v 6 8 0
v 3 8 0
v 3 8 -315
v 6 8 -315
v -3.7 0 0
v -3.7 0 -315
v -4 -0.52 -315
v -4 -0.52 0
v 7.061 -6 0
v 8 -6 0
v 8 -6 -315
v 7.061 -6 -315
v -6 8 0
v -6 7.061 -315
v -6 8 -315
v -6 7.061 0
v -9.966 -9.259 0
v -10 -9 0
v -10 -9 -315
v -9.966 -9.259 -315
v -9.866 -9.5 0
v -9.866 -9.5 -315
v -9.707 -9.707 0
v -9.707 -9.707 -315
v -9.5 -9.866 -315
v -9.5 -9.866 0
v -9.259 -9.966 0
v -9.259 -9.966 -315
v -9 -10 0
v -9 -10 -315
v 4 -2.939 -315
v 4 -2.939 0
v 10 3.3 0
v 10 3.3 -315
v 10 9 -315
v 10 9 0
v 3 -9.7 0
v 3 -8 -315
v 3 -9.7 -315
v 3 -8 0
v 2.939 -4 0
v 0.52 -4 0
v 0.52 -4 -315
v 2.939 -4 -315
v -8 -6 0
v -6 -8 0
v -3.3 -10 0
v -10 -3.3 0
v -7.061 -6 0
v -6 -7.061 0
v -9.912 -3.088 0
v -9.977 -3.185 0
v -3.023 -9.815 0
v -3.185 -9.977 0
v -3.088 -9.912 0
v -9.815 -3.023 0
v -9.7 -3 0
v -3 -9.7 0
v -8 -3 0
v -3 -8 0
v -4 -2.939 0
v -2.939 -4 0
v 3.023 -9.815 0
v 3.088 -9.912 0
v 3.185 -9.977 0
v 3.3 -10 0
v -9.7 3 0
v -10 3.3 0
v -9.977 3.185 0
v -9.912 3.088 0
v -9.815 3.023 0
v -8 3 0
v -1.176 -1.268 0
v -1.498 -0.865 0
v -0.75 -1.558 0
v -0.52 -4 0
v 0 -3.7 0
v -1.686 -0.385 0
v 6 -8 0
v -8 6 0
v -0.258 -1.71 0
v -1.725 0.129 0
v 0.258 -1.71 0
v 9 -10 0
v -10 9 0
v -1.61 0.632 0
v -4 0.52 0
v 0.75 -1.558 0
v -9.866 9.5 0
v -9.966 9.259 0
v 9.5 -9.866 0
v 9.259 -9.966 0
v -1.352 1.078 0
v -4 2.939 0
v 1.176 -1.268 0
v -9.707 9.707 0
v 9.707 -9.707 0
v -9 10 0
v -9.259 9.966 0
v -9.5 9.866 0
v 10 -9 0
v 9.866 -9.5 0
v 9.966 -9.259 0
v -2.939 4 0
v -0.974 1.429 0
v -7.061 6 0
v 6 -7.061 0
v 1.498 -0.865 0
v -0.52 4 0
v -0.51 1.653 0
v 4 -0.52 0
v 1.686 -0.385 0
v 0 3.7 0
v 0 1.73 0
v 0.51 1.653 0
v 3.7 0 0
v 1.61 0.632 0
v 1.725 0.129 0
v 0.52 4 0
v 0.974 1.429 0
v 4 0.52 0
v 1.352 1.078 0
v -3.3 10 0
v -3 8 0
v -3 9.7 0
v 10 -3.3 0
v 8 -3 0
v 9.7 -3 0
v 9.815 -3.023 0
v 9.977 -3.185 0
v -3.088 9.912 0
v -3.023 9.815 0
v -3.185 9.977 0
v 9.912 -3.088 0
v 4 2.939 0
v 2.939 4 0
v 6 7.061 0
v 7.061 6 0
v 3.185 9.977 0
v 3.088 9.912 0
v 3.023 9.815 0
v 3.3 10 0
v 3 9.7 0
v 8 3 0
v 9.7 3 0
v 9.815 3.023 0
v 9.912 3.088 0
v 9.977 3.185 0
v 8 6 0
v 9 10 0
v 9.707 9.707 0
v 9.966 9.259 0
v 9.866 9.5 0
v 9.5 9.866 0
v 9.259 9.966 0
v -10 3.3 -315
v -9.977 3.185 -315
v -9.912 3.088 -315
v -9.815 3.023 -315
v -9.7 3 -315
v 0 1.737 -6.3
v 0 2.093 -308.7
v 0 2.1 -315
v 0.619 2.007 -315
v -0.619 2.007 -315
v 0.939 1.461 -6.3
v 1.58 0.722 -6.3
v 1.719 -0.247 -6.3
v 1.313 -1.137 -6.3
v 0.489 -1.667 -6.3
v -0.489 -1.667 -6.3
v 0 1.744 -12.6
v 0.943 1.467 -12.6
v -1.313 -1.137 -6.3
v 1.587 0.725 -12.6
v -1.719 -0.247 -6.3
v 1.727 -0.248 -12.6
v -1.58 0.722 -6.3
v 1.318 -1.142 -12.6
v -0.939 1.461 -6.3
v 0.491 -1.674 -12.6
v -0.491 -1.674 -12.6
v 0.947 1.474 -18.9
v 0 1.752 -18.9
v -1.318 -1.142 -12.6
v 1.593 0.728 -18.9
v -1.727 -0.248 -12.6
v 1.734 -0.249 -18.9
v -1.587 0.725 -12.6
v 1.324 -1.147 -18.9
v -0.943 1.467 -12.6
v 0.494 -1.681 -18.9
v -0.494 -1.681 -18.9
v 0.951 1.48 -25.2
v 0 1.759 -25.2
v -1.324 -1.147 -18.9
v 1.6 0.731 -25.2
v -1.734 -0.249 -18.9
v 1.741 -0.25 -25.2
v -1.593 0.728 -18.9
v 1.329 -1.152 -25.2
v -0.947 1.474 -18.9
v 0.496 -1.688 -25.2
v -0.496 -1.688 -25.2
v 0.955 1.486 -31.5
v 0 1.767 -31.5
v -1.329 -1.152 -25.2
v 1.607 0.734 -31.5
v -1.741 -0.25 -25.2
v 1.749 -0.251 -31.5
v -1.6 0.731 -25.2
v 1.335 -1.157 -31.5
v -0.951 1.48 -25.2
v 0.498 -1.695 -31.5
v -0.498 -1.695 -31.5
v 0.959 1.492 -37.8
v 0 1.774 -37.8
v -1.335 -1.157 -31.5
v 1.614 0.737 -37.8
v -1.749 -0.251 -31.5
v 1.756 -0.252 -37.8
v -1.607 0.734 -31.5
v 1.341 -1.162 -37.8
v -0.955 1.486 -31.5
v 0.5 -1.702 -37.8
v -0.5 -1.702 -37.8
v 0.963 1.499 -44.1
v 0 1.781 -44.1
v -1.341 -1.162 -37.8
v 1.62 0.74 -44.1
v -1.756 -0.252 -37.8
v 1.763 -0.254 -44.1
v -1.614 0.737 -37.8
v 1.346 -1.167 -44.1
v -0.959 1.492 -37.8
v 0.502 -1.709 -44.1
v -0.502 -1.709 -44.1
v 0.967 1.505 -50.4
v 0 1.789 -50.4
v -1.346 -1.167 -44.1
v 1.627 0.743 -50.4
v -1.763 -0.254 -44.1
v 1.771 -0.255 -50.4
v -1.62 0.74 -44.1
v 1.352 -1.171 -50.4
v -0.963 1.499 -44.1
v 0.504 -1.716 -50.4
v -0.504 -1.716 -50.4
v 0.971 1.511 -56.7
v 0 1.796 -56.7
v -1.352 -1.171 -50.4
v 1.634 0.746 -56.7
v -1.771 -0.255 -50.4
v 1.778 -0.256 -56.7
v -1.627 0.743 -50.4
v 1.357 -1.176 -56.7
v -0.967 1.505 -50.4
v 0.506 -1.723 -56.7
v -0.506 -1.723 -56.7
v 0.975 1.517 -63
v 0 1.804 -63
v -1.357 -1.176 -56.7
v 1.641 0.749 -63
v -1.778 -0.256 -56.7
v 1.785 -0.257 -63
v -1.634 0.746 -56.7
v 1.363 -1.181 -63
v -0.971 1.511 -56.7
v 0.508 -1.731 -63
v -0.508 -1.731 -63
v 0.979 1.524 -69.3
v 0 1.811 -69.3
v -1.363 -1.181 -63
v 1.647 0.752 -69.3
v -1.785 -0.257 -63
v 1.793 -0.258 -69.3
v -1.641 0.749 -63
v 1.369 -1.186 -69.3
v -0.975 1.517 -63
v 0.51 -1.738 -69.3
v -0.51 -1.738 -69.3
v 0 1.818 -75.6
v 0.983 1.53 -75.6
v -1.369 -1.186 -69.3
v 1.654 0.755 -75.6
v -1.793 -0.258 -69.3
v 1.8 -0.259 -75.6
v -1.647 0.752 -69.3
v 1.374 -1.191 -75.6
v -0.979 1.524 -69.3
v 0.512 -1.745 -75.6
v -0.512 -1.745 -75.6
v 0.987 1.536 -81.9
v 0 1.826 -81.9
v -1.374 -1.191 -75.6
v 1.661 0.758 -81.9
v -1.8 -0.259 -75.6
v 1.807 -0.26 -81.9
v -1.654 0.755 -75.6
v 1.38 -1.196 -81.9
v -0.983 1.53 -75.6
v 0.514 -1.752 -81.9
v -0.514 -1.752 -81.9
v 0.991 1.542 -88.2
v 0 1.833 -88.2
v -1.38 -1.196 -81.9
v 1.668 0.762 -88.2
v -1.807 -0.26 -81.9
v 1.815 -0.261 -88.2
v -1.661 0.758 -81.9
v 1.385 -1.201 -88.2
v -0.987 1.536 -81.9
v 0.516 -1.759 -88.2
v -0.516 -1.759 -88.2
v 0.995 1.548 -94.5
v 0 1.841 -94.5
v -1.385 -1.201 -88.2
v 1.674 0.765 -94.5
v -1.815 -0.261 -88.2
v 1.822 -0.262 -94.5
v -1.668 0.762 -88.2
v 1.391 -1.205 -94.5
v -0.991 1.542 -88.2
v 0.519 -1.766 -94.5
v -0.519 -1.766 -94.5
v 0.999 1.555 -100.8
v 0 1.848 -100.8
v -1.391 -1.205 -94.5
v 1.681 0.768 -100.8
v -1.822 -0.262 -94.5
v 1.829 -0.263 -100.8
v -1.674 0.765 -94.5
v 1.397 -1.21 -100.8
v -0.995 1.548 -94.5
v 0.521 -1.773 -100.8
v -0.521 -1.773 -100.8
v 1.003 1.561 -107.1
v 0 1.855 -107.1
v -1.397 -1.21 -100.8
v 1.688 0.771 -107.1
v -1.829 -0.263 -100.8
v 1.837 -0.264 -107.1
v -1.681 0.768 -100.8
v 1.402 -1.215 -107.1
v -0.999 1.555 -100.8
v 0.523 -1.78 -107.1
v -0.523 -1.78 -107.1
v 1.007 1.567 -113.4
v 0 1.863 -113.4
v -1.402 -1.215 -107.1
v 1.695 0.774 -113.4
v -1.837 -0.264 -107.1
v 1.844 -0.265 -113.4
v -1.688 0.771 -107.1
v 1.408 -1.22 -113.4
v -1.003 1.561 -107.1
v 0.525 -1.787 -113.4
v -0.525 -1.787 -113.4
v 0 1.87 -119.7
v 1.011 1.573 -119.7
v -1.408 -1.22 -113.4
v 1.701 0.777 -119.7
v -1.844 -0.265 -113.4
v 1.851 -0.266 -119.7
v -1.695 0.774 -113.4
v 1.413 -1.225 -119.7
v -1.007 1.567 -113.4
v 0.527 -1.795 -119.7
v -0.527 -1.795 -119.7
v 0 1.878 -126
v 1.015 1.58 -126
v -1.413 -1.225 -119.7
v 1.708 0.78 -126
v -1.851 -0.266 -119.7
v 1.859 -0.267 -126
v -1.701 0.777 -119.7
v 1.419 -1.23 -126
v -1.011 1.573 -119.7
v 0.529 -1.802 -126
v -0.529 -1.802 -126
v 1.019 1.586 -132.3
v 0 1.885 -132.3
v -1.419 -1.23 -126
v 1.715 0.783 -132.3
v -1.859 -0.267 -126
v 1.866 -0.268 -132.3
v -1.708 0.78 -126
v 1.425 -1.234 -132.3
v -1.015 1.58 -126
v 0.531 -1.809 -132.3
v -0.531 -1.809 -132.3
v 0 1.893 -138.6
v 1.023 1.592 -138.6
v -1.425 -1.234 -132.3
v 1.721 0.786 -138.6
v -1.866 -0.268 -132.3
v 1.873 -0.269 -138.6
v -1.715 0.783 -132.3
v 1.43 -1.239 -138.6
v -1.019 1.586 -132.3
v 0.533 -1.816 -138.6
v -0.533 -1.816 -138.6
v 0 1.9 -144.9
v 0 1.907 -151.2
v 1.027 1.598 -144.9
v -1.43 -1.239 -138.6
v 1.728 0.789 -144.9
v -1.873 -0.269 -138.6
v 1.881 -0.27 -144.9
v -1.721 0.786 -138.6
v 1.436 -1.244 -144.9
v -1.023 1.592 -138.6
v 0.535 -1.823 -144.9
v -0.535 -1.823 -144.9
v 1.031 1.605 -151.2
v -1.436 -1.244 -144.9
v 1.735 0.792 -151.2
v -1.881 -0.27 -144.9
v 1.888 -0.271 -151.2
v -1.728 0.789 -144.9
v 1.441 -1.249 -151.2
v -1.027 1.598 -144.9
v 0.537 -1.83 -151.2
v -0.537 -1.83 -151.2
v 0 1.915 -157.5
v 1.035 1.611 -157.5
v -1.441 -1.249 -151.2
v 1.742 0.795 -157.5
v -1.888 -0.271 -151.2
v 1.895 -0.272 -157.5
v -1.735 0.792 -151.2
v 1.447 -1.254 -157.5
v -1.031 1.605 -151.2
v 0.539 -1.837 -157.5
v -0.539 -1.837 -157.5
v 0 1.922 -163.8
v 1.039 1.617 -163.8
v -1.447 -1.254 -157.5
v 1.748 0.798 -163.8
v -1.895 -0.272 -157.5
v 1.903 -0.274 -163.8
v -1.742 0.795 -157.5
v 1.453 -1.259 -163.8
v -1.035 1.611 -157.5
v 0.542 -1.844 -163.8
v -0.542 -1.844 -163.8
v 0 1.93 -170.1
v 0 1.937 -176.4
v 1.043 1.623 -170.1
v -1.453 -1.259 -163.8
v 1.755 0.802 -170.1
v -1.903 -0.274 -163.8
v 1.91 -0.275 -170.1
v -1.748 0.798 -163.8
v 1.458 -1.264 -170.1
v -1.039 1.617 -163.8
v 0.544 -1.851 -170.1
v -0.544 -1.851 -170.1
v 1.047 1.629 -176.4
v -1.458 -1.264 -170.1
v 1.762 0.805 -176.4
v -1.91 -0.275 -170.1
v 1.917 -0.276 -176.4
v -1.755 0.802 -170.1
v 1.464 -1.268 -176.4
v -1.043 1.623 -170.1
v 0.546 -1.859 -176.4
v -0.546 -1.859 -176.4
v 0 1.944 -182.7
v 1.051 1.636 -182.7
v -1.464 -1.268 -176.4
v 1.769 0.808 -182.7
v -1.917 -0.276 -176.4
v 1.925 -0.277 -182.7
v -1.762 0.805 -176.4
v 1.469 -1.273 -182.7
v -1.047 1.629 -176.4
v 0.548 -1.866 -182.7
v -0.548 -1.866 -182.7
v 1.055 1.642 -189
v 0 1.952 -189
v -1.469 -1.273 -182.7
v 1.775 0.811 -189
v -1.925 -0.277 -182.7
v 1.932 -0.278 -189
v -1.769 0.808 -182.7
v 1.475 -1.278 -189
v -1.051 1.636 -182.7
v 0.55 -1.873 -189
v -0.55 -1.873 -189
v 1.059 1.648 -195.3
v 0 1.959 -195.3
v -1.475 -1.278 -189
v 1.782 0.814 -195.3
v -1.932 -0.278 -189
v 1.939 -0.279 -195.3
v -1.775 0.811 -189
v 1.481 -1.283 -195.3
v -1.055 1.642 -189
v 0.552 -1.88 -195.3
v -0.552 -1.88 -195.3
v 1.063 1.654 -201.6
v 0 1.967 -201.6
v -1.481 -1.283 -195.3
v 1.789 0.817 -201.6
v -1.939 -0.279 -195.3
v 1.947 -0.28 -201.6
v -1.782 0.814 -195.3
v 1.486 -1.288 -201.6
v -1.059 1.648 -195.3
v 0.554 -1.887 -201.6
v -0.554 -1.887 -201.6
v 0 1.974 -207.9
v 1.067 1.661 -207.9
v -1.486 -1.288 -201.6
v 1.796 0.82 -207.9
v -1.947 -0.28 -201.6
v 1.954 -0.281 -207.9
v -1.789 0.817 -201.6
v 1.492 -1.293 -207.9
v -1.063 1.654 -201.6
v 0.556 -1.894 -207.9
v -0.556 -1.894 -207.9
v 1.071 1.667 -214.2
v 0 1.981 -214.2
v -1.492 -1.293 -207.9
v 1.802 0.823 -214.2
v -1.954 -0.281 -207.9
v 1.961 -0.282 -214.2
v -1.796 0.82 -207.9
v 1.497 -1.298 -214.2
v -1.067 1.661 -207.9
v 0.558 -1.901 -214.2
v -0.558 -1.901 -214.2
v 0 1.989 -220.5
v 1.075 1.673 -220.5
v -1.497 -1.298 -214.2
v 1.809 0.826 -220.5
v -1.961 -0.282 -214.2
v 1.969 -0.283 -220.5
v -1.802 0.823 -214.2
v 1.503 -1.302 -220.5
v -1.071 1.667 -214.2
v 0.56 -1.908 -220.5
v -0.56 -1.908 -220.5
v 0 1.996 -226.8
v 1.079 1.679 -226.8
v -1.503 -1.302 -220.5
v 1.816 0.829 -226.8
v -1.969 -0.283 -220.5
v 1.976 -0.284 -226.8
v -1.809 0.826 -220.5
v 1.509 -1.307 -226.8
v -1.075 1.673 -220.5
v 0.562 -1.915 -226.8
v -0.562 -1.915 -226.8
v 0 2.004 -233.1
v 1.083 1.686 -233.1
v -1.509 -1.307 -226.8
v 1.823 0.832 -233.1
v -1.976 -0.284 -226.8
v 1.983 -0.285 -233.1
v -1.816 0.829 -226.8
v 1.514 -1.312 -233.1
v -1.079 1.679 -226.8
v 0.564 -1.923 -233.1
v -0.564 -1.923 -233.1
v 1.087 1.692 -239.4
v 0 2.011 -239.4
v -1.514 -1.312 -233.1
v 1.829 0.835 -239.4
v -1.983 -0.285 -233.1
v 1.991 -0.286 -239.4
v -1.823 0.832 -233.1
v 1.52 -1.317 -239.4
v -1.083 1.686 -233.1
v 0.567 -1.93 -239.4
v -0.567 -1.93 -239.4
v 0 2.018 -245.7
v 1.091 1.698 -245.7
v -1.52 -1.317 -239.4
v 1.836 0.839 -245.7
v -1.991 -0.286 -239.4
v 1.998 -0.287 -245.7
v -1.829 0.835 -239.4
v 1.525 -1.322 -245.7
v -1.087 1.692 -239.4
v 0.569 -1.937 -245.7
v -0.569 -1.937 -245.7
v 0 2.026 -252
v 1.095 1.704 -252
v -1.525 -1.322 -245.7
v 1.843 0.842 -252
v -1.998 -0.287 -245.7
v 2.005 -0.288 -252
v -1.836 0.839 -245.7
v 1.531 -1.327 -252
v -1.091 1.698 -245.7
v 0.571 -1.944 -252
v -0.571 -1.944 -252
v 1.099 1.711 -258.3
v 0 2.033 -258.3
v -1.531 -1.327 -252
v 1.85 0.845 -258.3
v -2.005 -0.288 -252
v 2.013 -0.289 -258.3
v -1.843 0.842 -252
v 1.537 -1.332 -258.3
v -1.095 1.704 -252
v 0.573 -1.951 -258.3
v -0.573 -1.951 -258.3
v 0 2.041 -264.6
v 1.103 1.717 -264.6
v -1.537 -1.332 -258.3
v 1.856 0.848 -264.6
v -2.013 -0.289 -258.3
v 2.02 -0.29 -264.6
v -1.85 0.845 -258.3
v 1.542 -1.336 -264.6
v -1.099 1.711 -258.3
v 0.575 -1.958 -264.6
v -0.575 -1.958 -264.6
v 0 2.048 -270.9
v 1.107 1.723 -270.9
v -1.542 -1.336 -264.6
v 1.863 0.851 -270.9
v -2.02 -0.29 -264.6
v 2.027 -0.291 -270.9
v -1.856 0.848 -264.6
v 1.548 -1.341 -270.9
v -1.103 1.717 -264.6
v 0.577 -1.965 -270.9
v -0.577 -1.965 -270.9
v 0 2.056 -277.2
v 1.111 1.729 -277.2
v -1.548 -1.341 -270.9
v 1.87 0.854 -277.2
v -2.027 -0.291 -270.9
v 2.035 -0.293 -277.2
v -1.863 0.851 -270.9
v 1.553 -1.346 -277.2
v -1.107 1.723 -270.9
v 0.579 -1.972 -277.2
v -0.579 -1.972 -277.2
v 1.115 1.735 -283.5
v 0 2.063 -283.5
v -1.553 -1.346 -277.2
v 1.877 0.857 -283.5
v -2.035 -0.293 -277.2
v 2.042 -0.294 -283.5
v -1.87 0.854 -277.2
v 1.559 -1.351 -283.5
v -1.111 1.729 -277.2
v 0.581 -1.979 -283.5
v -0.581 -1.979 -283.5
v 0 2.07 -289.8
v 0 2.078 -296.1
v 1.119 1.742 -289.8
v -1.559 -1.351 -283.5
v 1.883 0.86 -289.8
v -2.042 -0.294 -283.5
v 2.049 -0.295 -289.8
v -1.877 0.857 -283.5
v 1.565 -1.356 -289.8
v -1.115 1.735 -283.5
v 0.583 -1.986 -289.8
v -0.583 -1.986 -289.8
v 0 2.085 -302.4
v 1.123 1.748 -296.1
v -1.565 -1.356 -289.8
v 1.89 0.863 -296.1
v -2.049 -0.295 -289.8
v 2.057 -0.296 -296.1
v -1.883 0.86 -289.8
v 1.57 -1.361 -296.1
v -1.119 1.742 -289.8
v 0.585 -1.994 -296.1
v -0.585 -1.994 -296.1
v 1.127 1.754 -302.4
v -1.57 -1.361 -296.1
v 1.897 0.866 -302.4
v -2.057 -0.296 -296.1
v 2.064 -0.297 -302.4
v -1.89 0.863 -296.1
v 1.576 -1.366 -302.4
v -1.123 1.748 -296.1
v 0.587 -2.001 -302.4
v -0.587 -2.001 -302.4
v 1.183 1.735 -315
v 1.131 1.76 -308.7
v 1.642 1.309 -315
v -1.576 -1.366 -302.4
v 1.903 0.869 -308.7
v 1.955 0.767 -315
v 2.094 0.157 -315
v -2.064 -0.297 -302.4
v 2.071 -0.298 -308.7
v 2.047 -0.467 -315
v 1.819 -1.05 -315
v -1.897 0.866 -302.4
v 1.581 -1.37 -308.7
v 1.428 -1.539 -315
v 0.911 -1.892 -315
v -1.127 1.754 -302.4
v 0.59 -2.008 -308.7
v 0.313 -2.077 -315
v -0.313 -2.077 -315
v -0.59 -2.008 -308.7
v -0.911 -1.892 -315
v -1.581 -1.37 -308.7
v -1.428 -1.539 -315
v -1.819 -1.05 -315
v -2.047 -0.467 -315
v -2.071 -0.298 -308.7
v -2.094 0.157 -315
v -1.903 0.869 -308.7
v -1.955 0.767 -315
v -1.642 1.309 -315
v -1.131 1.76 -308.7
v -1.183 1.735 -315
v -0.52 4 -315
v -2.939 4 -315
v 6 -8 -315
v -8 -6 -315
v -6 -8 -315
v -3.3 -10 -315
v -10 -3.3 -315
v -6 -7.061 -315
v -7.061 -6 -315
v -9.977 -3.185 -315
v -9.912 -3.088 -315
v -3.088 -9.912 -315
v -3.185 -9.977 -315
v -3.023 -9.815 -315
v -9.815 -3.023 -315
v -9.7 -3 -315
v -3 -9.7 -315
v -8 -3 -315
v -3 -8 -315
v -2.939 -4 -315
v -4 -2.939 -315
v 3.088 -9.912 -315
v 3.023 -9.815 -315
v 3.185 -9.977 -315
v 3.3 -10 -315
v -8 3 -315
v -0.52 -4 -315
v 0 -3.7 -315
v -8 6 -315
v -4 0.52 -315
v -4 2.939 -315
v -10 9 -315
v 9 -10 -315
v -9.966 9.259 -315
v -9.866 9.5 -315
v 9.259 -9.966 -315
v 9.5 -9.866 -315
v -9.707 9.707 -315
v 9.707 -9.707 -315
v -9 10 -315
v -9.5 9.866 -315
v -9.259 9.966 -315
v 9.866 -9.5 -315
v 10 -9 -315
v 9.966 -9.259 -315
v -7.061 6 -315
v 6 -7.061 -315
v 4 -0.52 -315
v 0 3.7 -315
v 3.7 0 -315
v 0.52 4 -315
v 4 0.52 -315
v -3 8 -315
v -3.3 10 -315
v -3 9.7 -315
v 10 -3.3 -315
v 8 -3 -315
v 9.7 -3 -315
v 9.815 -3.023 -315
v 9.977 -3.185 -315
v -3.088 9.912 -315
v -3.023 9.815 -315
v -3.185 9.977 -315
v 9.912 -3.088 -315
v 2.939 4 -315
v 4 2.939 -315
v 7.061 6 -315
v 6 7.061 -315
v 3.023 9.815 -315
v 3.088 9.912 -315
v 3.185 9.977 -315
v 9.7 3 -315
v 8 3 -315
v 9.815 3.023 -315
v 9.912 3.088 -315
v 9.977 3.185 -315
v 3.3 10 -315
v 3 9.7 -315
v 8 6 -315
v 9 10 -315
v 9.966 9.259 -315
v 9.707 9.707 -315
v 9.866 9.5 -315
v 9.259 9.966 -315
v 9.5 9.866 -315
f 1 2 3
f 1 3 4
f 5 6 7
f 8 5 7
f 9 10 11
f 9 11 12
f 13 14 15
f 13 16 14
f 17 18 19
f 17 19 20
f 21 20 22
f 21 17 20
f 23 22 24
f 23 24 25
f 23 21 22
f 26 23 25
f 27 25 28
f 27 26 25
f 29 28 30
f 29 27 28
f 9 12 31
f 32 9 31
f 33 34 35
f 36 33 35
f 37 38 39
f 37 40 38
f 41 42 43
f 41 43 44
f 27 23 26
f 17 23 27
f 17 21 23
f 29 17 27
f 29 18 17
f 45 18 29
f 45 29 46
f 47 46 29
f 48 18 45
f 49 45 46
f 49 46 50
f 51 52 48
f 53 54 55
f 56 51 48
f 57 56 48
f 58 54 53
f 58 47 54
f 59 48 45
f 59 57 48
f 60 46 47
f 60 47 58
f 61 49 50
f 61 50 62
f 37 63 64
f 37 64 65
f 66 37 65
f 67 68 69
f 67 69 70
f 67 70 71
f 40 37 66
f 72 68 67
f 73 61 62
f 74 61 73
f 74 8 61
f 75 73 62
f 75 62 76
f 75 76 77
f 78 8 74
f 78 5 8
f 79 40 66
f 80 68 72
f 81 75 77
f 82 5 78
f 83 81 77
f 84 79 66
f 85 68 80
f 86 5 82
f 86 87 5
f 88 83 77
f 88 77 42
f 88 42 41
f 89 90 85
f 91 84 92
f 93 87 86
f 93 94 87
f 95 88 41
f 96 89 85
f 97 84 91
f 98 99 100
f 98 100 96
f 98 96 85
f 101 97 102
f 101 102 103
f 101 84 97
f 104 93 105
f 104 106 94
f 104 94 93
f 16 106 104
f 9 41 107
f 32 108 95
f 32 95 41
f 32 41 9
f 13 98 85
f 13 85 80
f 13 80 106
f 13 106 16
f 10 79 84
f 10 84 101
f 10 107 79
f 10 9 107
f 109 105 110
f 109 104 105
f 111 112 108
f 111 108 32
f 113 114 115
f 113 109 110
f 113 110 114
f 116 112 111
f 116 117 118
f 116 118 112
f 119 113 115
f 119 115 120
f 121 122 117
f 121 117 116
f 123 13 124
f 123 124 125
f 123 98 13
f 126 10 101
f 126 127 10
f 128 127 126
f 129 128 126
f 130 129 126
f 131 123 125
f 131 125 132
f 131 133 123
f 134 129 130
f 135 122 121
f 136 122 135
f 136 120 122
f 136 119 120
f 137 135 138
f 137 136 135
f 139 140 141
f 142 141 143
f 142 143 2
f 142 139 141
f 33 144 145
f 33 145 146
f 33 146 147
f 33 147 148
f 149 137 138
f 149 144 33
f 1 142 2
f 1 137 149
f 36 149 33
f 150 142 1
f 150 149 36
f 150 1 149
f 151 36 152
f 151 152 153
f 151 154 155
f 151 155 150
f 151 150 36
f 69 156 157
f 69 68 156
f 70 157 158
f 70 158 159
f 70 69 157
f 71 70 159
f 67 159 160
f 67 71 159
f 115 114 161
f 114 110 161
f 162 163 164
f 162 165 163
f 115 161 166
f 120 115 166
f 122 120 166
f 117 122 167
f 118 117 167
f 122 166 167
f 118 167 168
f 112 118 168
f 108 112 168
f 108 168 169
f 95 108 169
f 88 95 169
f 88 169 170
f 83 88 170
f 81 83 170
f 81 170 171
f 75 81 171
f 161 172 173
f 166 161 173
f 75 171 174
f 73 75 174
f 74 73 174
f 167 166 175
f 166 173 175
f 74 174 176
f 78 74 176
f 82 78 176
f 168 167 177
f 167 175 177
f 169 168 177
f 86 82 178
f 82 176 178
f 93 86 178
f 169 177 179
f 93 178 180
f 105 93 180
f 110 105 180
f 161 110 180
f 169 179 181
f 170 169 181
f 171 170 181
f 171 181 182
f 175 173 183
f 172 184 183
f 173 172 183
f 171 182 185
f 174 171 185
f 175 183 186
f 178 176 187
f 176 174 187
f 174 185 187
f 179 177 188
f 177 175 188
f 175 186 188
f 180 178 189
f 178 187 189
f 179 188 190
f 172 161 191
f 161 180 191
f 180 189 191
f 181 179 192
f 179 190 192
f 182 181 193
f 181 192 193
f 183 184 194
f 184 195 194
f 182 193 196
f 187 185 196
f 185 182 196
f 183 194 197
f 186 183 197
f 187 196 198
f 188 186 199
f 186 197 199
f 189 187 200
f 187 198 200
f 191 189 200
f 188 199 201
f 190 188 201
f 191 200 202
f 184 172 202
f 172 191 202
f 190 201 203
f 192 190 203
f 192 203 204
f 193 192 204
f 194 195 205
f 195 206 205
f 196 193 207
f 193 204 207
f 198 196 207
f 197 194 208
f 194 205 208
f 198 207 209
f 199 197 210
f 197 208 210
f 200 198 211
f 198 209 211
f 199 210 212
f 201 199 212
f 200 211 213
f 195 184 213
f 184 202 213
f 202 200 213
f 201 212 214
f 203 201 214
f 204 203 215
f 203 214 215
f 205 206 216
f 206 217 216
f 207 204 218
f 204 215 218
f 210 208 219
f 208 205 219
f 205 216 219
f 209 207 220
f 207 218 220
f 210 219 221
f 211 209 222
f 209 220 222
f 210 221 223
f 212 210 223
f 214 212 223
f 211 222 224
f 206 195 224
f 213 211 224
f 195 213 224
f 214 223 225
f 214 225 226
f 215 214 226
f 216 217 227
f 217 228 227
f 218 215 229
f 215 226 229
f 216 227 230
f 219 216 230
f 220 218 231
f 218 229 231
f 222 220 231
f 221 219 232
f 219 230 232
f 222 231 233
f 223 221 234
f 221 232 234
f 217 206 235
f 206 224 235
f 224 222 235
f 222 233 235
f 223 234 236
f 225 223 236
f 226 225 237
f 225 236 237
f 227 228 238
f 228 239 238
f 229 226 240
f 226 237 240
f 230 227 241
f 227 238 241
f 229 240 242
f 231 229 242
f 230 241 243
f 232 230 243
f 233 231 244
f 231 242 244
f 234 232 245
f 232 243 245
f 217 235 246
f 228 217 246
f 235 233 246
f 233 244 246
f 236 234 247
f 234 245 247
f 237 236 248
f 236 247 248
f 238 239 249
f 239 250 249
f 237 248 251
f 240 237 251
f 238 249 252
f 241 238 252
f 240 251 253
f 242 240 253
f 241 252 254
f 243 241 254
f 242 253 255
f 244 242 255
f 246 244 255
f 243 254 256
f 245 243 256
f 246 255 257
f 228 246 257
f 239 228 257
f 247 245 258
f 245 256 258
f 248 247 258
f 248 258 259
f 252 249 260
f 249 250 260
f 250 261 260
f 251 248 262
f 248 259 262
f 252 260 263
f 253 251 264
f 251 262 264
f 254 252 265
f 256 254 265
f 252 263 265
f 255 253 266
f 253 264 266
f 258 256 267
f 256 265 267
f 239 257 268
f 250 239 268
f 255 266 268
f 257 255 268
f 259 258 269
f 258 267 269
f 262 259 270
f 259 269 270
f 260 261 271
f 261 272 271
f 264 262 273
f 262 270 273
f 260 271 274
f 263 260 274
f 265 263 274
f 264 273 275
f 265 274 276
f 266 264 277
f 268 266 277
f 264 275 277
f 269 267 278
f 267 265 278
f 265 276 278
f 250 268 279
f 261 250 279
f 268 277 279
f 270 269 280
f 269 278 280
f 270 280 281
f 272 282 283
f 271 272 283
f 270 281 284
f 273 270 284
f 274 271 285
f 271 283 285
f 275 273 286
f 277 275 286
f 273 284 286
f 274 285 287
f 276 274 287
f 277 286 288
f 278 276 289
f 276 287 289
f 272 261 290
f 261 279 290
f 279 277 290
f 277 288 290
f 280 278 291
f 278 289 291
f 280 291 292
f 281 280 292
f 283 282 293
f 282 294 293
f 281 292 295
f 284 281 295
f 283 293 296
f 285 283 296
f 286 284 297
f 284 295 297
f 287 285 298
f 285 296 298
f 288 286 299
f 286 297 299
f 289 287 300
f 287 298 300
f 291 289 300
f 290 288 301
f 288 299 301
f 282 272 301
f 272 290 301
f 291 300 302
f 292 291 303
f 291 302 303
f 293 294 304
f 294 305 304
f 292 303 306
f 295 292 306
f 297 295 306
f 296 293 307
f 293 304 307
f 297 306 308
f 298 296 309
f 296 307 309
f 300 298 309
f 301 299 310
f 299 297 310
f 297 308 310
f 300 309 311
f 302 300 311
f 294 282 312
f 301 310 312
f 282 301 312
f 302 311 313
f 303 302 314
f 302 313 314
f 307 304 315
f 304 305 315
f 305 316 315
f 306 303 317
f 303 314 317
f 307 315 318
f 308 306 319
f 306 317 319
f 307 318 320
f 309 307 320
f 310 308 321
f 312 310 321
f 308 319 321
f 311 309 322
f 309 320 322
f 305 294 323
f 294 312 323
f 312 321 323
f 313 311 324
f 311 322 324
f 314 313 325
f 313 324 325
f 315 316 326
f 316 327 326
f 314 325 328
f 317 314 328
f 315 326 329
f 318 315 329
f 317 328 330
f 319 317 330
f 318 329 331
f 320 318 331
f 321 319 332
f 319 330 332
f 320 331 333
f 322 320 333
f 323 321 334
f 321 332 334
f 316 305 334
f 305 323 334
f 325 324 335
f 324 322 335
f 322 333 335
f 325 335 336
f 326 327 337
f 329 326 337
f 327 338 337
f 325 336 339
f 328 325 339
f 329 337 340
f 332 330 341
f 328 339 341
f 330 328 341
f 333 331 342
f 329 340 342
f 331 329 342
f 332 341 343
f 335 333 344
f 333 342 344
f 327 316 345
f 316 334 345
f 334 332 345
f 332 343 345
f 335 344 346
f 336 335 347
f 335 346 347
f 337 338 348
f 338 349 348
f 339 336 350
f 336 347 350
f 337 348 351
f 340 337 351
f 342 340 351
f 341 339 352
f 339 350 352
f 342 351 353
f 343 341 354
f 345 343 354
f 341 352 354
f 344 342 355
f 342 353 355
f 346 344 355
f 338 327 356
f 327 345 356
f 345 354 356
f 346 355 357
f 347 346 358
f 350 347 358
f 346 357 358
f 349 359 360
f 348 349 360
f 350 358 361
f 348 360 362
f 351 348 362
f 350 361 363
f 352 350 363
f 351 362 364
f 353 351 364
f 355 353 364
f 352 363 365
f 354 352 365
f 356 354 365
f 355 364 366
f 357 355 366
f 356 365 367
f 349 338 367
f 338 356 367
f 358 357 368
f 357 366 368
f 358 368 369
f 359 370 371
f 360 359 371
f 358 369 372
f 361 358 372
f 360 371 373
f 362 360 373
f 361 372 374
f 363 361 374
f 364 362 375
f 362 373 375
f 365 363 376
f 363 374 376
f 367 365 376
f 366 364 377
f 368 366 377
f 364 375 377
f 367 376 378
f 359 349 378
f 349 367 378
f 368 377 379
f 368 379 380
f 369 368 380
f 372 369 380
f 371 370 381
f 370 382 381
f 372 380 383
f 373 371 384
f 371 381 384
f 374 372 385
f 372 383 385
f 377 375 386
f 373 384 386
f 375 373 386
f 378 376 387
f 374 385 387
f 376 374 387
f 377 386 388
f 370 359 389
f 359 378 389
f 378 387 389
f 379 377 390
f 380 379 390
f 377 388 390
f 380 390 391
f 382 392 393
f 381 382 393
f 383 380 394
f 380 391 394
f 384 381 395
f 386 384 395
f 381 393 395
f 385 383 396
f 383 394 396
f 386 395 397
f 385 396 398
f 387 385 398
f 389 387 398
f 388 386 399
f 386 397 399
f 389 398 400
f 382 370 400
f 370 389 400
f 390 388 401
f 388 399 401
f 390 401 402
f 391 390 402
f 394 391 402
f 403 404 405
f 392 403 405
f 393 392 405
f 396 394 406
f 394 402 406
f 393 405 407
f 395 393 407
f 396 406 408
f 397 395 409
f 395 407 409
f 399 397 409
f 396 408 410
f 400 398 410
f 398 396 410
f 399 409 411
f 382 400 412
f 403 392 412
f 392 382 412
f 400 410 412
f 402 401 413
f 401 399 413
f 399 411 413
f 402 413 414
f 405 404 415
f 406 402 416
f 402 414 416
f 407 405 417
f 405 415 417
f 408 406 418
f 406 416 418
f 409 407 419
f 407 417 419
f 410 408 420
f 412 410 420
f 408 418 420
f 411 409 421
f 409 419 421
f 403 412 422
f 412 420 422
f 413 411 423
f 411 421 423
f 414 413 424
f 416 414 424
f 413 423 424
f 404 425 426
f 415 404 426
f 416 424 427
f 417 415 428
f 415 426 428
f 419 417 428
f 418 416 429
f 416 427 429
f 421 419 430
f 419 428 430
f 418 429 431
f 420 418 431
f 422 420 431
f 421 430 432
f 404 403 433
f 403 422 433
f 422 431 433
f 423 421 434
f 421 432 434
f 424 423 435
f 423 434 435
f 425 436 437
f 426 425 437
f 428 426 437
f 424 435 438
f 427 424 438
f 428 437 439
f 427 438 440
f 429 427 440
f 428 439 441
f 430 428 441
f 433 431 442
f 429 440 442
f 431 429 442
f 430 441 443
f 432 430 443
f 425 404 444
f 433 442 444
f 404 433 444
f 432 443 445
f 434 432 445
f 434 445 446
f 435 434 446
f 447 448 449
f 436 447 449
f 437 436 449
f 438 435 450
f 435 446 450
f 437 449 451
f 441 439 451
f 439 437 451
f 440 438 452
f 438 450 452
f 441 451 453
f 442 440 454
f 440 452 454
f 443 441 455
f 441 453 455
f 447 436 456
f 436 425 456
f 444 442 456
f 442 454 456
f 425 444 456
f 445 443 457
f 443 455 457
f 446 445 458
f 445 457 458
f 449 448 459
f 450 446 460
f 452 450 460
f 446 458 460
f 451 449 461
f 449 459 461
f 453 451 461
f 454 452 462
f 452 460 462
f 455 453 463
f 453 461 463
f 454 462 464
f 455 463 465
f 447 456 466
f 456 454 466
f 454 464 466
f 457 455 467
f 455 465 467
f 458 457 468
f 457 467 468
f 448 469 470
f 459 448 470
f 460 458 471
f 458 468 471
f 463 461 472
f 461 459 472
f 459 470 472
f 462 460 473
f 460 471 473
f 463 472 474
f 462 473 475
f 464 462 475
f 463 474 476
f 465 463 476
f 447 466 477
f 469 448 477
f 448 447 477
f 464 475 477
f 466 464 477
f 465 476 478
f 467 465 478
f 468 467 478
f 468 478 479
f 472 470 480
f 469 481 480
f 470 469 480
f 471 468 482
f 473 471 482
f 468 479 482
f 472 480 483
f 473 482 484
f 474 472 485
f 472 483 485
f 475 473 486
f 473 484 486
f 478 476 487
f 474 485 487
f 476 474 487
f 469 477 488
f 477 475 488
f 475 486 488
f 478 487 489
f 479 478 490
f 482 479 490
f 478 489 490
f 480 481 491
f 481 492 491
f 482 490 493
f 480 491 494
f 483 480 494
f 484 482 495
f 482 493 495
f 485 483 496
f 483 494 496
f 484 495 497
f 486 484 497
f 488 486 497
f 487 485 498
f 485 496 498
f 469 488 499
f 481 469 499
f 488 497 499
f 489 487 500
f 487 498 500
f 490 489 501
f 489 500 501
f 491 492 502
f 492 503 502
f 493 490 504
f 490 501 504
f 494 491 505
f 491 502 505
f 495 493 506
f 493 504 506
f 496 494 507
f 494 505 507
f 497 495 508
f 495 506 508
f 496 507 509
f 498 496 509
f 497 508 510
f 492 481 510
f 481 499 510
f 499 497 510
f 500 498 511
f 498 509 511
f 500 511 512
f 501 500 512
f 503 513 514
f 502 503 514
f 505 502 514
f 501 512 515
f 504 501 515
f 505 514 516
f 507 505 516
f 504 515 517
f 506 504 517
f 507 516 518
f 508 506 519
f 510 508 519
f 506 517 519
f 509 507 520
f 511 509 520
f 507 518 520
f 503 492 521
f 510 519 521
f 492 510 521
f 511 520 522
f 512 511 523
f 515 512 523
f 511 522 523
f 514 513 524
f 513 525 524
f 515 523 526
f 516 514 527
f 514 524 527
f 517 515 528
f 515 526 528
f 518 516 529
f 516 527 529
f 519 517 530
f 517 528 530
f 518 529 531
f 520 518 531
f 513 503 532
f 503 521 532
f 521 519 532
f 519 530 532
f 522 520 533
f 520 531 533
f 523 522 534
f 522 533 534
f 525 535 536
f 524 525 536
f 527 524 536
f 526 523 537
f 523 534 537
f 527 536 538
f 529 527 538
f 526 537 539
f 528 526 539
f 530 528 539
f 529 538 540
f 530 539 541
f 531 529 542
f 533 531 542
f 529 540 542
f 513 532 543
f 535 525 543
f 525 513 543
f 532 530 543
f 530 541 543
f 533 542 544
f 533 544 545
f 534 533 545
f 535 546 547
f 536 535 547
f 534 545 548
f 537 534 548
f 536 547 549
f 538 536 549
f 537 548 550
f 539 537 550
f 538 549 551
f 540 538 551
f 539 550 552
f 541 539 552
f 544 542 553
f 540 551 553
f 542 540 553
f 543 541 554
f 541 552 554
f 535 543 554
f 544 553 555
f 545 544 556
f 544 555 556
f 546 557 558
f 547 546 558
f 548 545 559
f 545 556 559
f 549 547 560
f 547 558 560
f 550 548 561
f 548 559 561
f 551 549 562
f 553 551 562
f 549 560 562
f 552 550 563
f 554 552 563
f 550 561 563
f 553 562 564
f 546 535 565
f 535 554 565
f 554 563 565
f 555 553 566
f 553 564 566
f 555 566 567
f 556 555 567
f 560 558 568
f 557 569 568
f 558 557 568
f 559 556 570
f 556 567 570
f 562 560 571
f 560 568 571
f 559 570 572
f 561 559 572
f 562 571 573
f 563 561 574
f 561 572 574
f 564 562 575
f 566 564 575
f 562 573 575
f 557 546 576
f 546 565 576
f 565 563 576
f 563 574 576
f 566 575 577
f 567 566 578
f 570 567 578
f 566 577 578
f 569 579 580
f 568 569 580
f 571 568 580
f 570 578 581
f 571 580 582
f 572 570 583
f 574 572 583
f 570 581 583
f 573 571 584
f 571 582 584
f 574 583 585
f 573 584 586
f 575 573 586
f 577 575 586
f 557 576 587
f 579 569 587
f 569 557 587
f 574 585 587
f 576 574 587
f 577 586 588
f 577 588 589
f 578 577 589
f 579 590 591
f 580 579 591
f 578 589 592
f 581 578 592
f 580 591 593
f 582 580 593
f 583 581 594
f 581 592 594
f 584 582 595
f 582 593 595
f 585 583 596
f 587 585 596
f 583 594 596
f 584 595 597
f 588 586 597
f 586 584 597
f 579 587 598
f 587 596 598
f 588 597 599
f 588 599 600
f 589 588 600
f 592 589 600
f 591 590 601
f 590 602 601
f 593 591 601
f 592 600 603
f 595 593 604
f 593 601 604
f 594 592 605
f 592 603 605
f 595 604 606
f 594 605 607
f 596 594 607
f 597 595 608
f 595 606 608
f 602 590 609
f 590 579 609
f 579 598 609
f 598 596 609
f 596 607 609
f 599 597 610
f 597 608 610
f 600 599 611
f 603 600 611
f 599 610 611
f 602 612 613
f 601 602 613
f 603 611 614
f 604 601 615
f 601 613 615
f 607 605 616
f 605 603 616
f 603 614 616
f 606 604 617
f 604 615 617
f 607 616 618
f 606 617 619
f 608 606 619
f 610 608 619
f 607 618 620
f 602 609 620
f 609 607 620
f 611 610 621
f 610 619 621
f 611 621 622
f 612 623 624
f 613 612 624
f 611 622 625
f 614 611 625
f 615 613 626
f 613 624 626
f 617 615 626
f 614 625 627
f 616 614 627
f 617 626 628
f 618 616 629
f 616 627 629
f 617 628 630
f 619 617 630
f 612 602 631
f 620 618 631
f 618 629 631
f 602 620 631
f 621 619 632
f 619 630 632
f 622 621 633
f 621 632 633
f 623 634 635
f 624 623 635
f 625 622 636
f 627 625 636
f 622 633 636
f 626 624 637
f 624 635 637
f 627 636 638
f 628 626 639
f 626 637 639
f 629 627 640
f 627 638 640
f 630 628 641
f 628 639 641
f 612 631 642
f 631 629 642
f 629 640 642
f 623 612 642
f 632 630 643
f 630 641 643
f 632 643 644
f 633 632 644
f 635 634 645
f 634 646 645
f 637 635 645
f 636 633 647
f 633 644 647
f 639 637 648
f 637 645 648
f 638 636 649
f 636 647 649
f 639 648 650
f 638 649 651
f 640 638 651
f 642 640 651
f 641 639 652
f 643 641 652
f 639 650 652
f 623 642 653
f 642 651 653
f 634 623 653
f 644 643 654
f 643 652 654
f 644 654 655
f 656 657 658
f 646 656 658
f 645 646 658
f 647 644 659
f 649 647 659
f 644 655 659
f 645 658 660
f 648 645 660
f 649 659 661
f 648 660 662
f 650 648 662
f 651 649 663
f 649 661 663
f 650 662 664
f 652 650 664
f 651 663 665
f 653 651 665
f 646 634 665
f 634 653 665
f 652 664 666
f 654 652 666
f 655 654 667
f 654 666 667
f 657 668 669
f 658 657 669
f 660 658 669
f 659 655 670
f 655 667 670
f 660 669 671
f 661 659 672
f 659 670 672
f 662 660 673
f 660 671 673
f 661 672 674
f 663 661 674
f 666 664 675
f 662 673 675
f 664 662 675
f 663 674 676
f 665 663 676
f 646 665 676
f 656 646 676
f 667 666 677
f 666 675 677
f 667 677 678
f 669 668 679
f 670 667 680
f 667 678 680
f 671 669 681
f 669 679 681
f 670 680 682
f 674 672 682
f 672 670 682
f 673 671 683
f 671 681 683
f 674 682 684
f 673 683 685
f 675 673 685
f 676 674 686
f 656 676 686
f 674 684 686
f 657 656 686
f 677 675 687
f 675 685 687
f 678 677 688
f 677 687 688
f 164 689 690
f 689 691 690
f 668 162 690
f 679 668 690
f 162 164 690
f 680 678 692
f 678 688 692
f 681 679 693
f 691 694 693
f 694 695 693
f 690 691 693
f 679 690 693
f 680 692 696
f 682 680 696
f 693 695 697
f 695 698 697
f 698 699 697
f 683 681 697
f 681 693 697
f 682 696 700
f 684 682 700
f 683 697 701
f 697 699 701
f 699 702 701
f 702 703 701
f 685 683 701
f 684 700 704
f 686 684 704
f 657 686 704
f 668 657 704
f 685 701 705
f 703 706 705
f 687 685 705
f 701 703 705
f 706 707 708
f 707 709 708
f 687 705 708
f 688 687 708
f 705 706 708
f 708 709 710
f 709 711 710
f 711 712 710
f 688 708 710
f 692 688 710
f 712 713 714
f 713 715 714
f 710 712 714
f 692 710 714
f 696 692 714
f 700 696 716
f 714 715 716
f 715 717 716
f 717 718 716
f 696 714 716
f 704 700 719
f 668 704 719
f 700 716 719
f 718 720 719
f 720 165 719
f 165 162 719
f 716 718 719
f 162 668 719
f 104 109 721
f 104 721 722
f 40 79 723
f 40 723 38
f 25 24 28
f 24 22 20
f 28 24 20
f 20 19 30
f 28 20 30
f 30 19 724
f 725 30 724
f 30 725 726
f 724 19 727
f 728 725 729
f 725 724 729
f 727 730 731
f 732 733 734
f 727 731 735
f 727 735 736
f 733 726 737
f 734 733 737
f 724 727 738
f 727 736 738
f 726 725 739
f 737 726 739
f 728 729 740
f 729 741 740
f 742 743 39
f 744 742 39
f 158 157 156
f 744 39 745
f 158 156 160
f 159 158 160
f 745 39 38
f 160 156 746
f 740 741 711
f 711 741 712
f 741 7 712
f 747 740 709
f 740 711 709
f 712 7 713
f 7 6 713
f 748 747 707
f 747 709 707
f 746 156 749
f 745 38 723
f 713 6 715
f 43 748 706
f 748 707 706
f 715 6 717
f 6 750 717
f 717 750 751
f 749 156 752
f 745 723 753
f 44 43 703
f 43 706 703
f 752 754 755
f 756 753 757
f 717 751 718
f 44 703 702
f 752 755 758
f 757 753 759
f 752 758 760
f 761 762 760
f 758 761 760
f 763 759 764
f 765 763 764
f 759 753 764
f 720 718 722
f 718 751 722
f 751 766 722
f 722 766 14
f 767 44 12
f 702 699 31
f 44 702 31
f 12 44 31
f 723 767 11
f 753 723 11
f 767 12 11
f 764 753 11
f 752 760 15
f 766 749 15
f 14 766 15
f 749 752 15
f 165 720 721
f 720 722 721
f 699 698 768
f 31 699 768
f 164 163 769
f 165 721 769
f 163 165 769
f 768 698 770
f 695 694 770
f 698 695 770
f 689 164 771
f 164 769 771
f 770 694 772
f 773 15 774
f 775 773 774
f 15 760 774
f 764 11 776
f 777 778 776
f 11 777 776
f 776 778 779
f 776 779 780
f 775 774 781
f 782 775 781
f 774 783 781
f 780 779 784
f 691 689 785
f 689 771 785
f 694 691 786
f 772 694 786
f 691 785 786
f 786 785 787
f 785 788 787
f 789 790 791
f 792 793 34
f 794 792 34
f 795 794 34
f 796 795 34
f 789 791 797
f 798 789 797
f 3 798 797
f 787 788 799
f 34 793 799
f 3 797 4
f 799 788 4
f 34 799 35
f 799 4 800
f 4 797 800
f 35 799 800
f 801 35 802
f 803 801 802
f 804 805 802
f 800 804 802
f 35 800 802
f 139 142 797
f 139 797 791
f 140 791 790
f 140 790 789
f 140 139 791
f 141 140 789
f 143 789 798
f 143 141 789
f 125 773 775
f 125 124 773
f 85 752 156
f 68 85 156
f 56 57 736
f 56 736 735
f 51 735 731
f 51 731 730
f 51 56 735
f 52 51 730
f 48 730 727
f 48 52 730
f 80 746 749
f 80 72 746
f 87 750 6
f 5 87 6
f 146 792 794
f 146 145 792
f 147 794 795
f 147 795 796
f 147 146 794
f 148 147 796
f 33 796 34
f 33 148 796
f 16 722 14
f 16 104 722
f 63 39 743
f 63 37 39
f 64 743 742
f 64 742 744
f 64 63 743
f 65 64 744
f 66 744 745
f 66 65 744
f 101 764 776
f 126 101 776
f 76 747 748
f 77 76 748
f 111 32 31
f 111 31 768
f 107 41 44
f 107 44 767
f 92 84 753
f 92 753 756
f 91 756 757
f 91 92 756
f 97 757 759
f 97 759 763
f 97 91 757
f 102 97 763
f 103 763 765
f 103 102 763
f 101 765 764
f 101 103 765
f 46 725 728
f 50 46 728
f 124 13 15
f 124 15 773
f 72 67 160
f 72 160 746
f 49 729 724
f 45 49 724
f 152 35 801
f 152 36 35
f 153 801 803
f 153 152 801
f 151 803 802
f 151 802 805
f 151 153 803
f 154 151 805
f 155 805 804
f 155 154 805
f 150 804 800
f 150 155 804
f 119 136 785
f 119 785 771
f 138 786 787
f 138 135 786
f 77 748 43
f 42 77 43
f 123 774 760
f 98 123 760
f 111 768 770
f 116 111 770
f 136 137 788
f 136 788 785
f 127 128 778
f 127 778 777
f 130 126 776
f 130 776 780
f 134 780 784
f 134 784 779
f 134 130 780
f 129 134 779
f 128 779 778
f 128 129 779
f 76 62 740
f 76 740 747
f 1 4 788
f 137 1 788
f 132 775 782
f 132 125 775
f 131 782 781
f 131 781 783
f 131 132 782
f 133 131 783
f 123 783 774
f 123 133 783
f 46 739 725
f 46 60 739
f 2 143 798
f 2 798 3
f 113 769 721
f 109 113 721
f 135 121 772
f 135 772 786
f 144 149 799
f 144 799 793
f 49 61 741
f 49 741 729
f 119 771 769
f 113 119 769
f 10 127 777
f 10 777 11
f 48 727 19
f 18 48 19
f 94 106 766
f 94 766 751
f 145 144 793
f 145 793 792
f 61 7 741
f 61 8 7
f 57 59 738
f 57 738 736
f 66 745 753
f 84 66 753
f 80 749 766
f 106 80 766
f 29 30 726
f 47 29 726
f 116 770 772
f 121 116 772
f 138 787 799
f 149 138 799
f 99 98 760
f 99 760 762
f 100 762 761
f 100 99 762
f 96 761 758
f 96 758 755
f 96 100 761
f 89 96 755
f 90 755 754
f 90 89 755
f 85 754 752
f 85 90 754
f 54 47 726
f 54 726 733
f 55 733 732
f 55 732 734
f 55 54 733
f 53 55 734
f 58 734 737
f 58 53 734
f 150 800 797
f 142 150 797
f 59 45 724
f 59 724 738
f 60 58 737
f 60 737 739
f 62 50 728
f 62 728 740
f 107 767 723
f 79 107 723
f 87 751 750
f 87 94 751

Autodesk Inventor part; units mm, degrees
sketch "Sketch_1" plane through (0, 0, 0) normal (0, 0, 1) x (1, 0, 0)
  line L0 (-10, 9) -> (-10, 3.3)
  arc A0 (-10, 3.3) -> (-9.7, 3) centre (-9.7, 3.3) ccw
  line L1 (-9.7, 3) -> (-8, 3)
  line L2 (-8, 3) -> (-8, 6)
  line L3 (-8, 6) -> (-7.0607, 6)
  line L4 (-7.0607, 6) -> (-4, 2.9393)
  line L5 (-4, 2.9393) -> (-4, 0.5196)
  line L6 (-4, 0.5196) -> (-3.7, 0)
  line L7 (-3.7, 0) -> (-4, -0.5196)
  line L8 (-4, -0.5196) -> (-4, -2.9393)
  line L9 (-4, -2.9393) -> (-7.0607, -6)
  line L10 (-7.0607, -6) -> (-8, -6)
  line L11 (-8, -6) -> (-8, -3)
  line L12 (-8, -3) -> (-9.7, -3)
  arc A1 (-9.7, -3) -> (-10, -3.3) centre (-9.7, -3.3) ccw
  line L13 (-10, -3.3) -> (-10, -9)
  arc A2 (-10, -9) -> (-9, -10) centre (-9, -9) ccw
  line L14 (-9, -10) -> (-3.3, -10)
  arc A3 (-3.3, -10) -> (-3, -9.7) centre (-3.3, -9.7) ccw
  line L15 (-3, -9.7) -> (-3, -8)
  line L16 (-3, -8) -> (-6, -8)
  line L17 (-6, -8) -> (-6, -7.0607)
  line L18 (-6, -7.0607) -> (-2.9393, -4)
  line L19 (-2.9393, -4) -> (-0.5196, -4)
  line L20 (-0.5196, -4) -> (0, -3.7)
  line L21 (0, -3.7) -> (0.5196, -4)
  line L22 (0.5196, -4) -> (2.9393, -4)
  line L23 (2.9393, -4) -> (6, -7.0607)
  line L24 (6, -7.0607) -> (6, -8)
  line L25 (6, -8) -> (3, -8)
  line L26 (3, -8) -> (3, -9.7)
  arc A4 (3, -9.7) -> (3.3, -10) centre (3.3, -9.7) ccw
  line L27 (3.3, -10) -> (9, -10)
  arc A5 (9, -10) -> (10, -9) centre (9, -9) ccw
  line L28 (10, -9) -> (10, -3.3)
  arc A6 (10, -3.3) -> (9.7, -3) centre (9.7, -3.3) ccw
  line L29 (9.7, -3) -> (8, -3)
  line L30 (8, -3) -> (8, -6)
  line L31 (8, -6) -> (7.0606, -6)
  line L32 (7.0606, -6) -> (4, -2.9393)
  line L33 (4, -2.9393) -> (4, -0.5196)
  line L34 (4, -0.5196) -> (3.7, 0)
  line L35 (3.7, 0) -> (4, 0.5196)
  line L36 (4, 0.5196) -> (4, 2.9393)
  line L37 (4, 2.9393) -> (7.0607, 6)
  line L38 (7.0607, 6) -> (8, 6)
  line L39 (8, 6) -> (8, 3)
  line L40 (8, 3) -> (9.7, 3)
  arc A7 (9.7, 3) -> (10, 3.3) centre (9.7, 3.3) ccw
  line L41 (10, 3.3) -> (10, 9)
  arc A8 (10, 9) -> (9, 10) centre (9, 9) ccw
  line L42 (9, 10) -> (3.3, 10)
  arc A9 (3.3, 10) -> (3, 9.7) centre (3.3, 9.7) ccw
  line L43 (3, 9.7) -> (3, 8)
  line L44 (3, 8) -> (6, 8)
  line L45 (6, 8) -> (6, 7.0607)
  line L46 (6, 7.0607) -> (2.9393, 4)
  line L47 (2.9393, 4) -> (0.5196, 4)
  line L48 (0.5196, 4) -> (0, 3.7)
  line L49 (0, 3.7) -> (-0.5196, 4)
  line L50 (-0.5196, 4) -> (-2.9394, 4)
  line L51 (-2.9394, 4) -> (-6, 7.0606)
  line L52 (-6, 7.0606) -> (-6, 8)
  line L53 (-6, 8) -> (-3, 8)
  line L54 (-3, 8) -> (-3, 9.7)
  arc A10 (-3, 9.7) -> (-3.3, 10) centre (-3.3, 9.7) ccw
  line L55 (-3.3, 10) -> (-9, 10)
  arc A11 (-9, 10) -> (-10, 9) centre (-9, 9) ccw
extrude "Extrusion1" add sketch "Sketch_1" against normal blind 315
sketch "Sketch_2" plane through (0, 0, 0) normal (1, 0, 0) x (0, 0, -1)
  line L0 (315, -2.9393) -> (315, -0.5196) projected
  line L1 (0, 0.5196) -> (0, 2.9393) projected
  line L2 (0, 0) -> (0, 0.5196) projected
  line L3 (0, 0) -> (315, 0)
  line L4 (315, 0) -> (315, 2.1)
  line L5 (315, 0.5196) -> (315, 2.9393) projected
  line L6 (315, 2.1) -> (0, 1.7295)
  line L7 (0, 1.7295) -> (0, 0)
  dimension "d3" = 2.1
ref_plane "C1_XY" through (0, 0, 0) normal (0, 0, 1) x (1, 0, 0)
ref_plane "C1_YZ" through (0, 0, 0) normal (1, 0, 0) x (0, 1, 0)
ref_plane "C1_ZX" through (0, 0, 0) normal (0, 1, 0) x (0, 0, 1)
revolve "Revolution2" cut sketch "Sketch_2" angle 360 about axis through (0, 0, 0) along (0, 0, -1)
properties part number "FrameExtruderVerticalSupport" material "Aluminum 6061"
